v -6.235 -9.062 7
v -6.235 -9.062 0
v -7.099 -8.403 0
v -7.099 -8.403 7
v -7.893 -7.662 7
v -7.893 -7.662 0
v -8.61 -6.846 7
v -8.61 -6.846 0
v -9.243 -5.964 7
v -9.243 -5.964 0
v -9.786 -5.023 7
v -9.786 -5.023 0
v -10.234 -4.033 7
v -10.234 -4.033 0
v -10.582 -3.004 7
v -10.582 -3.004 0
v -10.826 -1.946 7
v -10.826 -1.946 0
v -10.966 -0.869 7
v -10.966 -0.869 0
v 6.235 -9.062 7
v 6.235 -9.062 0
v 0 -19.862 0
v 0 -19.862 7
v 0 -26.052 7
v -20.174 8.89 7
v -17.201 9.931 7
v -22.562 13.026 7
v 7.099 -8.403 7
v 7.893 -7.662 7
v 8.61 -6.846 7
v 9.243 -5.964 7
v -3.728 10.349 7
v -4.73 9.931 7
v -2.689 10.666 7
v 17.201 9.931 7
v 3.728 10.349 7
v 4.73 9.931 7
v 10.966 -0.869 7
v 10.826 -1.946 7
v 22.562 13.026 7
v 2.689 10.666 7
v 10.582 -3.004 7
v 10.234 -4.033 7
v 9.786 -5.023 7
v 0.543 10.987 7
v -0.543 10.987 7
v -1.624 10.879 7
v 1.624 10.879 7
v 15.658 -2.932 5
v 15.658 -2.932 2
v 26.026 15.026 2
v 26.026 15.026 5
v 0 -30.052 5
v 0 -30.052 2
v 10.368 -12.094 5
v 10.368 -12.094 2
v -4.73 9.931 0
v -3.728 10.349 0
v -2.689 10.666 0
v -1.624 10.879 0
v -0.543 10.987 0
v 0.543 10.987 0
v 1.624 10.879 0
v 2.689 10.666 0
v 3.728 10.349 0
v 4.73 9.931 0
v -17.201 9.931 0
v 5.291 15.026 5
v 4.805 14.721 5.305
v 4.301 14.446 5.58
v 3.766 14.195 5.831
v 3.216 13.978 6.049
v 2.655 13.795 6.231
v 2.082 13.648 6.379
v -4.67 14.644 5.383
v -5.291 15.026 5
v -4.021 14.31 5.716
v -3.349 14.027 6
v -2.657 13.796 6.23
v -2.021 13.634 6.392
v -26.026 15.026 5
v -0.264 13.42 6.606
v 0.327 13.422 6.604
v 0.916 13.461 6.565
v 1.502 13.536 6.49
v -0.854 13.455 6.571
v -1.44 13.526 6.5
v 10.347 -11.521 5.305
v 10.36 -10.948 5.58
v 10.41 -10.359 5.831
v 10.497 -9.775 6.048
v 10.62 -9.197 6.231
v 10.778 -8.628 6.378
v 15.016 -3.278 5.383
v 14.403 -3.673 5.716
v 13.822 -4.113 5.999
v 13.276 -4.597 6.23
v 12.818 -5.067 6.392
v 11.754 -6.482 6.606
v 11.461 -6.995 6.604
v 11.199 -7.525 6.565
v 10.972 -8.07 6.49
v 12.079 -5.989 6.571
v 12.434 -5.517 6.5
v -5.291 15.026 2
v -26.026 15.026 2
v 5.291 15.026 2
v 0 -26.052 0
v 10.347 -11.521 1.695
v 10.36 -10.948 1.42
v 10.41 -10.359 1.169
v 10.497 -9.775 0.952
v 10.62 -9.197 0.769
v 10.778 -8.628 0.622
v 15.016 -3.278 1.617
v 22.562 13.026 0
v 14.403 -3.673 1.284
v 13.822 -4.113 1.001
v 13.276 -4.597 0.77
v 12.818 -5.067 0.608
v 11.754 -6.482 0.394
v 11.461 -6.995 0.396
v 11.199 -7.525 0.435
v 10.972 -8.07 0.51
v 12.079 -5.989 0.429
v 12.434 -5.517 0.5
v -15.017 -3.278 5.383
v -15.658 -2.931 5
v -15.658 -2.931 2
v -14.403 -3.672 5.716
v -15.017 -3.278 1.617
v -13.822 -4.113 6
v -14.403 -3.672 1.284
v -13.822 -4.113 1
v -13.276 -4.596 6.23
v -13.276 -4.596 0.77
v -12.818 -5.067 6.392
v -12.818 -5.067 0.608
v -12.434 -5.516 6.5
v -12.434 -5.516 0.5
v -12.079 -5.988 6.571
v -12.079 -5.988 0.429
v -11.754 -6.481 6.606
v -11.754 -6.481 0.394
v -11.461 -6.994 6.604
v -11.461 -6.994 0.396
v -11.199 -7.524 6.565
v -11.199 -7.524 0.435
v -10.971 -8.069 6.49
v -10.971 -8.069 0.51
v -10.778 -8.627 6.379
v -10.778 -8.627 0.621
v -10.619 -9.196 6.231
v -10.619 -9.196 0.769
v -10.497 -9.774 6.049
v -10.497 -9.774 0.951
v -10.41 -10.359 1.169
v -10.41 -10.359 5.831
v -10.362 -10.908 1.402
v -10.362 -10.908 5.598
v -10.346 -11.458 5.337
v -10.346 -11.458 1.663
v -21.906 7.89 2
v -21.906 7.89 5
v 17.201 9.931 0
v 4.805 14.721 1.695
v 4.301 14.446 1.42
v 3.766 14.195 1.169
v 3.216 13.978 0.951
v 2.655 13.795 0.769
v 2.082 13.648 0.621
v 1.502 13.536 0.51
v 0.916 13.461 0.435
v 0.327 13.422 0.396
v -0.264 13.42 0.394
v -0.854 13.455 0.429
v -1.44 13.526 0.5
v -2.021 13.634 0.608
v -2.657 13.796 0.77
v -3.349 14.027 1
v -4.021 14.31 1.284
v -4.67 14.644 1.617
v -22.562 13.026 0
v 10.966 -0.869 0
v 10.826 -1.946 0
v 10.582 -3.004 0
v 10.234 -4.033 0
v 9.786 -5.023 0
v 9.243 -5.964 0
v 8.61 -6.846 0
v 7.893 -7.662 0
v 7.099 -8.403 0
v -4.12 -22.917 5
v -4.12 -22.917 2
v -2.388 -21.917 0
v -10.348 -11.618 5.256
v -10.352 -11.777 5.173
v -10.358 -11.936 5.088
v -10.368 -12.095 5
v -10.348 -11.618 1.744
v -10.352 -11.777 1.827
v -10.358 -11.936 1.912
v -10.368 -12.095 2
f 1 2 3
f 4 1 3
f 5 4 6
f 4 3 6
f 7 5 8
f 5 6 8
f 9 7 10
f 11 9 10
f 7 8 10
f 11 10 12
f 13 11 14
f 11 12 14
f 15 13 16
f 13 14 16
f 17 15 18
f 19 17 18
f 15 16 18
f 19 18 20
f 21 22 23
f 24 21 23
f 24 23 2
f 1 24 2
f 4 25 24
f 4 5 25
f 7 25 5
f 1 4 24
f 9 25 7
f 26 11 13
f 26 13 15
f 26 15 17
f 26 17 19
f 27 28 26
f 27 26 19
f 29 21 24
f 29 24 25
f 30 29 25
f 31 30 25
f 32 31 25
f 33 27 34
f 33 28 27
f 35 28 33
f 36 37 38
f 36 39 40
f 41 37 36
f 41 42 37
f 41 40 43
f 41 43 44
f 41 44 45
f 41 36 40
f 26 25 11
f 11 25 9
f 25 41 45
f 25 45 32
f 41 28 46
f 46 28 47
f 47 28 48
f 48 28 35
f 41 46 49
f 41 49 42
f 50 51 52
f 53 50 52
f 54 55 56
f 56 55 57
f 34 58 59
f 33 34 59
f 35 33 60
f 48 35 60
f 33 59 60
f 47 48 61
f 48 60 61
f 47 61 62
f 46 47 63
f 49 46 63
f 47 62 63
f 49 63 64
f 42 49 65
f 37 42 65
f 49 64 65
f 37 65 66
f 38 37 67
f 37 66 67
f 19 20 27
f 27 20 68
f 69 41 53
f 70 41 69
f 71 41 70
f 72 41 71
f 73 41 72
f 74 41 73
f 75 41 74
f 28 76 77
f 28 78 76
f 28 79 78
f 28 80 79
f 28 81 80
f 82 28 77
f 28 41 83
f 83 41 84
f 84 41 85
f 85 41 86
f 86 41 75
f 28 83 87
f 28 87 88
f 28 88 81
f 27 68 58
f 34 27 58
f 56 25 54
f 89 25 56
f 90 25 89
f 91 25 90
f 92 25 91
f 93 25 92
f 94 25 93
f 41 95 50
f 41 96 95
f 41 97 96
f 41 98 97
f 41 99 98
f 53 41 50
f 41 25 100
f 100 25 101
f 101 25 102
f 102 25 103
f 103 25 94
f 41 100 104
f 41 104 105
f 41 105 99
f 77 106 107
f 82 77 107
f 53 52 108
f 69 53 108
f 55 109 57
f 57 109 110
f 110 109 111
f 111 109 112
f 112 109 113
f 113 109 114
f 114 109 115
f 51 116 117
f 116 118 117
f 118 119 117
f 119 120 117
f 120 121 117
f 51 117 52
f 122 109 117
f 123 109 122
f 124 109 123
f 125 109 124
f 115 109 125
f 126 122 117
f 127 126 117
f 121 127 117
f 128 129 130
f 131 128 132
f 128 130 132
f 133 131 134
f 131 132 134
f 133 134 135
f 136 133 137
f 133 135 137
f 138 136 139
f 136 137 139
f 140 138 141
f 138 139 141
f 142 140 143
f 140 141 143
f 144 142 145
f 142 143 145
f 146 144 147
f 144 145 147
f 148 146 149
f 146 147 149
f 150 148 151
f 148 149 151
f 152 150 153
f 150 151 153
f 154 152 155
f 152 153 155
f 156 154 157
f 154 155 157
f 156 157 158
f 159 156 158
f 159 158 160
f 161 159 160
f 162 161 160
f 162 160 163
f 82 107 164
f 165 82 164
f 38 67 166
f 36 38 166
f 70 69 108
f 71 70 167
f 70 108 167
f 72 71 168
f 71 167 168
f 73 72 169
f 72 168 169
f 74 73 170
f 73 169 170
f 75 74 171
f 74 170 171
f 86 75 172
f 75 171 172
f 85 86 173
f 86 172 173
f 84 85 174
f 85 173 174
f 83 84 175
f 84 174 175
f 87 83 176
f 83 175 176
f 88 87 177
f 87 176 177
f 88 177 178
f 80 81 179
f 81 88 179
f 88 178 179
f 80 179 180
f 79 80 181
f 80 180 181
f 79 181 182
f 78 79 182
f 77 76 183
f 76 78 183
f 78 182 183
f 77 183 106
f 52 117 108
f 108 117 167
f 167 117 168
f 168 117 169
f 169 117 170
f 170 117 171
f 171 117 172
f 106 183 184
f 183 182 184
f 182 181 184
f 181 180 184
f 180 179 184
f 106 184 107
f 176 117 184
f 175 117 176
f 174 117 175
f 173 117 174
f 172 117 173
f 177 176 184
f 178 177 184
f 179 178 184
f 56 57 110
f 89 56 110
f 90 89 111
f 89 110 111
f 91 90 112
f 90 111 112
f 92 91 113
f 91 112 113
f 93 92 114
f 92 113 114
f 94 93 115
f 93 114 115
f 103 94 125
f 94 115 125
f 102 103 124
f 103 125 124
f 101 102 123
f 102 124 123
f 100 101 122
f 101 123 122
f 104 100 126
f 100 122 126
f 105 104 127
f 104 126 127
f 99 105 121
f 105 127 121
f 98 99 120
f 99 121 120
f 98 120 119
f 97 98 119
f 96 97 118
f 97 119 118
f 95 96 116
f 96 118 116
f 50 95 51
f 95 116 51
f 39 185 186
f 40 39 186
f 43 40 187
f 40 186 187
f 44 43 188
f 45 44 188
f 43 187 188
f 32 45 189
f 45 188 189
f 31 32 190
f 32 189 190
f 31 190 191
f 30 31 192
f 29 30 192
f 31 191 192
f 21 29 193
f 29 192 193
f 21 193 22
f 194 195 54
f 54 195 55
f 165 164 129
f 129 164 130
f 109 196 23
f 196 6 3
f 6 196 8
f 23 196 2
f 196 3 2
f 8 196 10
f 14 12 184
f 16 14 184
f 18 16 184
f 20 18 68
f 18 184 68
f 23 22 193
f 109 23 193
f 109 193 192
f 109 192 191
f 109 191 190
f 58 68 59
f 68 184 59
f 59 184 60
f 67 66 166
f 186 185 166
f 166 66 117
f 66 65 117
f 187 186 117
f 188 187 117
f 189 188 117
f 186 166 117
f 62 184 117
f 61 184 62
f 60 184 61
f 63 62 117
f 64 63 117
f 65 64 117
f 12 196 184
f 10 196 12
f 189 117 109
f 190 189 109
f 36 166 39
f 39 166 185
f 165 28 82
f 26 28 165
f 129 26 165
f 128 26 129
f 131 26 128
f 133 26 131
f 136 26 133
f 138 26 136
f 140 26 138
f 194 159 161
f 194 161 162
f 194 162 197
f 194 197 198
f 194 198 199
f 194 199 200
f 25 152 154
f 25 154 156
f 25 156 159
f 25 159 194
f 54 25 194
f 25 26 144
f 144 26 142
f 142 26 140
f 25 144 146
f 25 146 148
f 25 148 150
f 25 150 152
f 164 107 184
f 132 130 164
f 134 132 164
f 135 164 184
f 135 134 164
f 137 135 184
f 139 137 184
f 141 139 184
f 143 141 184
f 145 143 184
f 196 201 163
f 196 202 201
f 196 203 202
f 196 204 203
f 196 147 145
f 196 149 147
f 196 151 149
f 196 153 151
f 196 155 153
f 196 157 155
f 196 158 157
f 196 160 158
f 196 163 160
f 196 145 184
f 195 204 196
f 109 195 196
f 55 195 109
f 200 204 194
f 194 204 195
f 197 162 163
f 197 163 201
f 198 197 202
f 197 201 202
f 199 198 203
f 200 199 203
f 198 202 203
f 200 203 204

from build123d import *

# Parameters (mm, degrees)
F1_DEPTH = 7
F2_SIZE  = 2


with BuildPart() as f1:
    # F0 (on Top) → F1 (new body)
    with BuildSketch(Plane.XY):
        with BuildLine():
            Line((-5.2907653123, 15.0261512026), (-17.7863569535, 15.0261512026))
            Line((-17.7863569535, 15.0261512026), (-21.9062071393, 7.8903613612))
            Line((-21.9062071393, 7.8903613612), (-15.6584113187, -2.9311384354))
            ThreePointArc((-15.6584113187, -2.9311384354), (-11.782946139, -6.4350487366), (-10.3462820464, -11.4582562819))
            ThreePointArc((-10.3462820464, -11.4582562819), (-10.3516245386, -11.7768136709), (-10.3676460064, -12.0950127672))
            Line((-10.3676460064, -12.0950127672), (-4.1198501858, -22.9165125638))
            Line((-4.1198501858, -22.9165125638), (4.1198501858, -22.9165125638))
            Line((4.1198501858, -22.9165125638), (10.3680051395, -12.0943907304))
            ThreePointArc((10.3680051395, -12.0943907304), (11.6193871206, -6.7084562819), (15.6580521856, -2.9317604722))
            Line((15.6580521856, -2.9317604722), (21.9062071393, 7.8903613612))
            Line((21.9062071393, 7.8903613612), (17.7863569535, 15.0261512026))
            Line((17.7863569535, 15.0261512026), (5.2907653123, 15.0261512026))
            ThreePointArc((5.2907653123, 15.0261512026), (0, 13.4165125638), (-5.2907653123, 15.0261512026))
        make_face()
        with BuildLine():
            ThreePointArc((-4.7301378537, 9.9310521036), (0, 11), (4.7301378537, 9.9310521036))
            Line((4.7301378537, 9.9310521036), (17.2010868161, 9.9310521036))
            Line((17.2010868161, 9.9310521036), (10.9656123349, -0.8691065071))
            ThreePointArc((10.9656123349, -0.8691065071), (9.5262794416, -5.5), (6.2354744812, -9.0619455965))
            Line((6.2354744812, -9.0619455965), (0, -19.8621042073))
            Line((0, -19.8621042073), (-6.2354744812, -9.0619455965))
            ThreePointArc((-6.2354744812, -9.0619455965), (-9.5262794416, -5.5), (-10.9656123349, -0.8691065071))
            Line((-10.9656123349, -0.8691065071), (-17.2010868161, 9.9310521036))
            Line((-17.2010868161, 9.9310521036), (-4.7301378537, 9.9310521036))
        make_face(mode=Mode.SUBTRACT)
        Polygon((-17.7863569535, 15.0261512026), (-26.0260573251, 15.0261512026), (-21.9062071393, 7.8903613612), align=None)
        Polygon((26.0260573251, 15.0261512026), (17.7863569535, 15.0261512026), (21.9062071393, 7.8903613612), align=None)
        Polygon((4.1198501858, -22.9165125638), (-4.1198501858, -22.9165125638), (0, -30.0523024052), align=None)
    extrude(amount=F1_DEPTH)

    # F2 (call 1 of 5: OpenCascade refuses the feature's edges together)
    f2_edges = [f1.edges().sort_by_distance(p)[0] for p in [
        (-20.842234, 6.047506, 7),
        (-15.658411, 15.026151, 7),
    ]]
    chamfer(f2_edges, length=F2_SIZE)

    # F2#2 (call 2 of 5)
    f2_2_edges = [f1.edges().sort_by_distance(p)[0] for p in [
        (-5.183823, -21.073658, 0),
    ]]
    chamfer(f2_2_edges, length=F2_SIZE)

    # F2#3 (call 3 of 5)
    f2_3_edges = [f1.edges().sort_by_distance(p)[0] for p in [
        (-15.658411, 15.026151, 0),
    ]]
    chamfer(f2_3_edges, length=F2_SIZE)

    # F2#4 (call 4 of 5)
    f2_4_edges = [f1.edges().sort_by_distance(p)[0] for p in [
        (20.842055, 6.047195, 7),
    ]]
    chamfer(f2_4_edges, length=F2_SIZE)

    # F2#5 (call 5 of 5)
    f2_5_edges = [f1.edges().sort_by_distance(p)[0] for p in [
        (20.842055, 6.047195, 0),
    ]]
    chamfer(f2_5_edges, length=F2_SIZE)


solid = f1.part
